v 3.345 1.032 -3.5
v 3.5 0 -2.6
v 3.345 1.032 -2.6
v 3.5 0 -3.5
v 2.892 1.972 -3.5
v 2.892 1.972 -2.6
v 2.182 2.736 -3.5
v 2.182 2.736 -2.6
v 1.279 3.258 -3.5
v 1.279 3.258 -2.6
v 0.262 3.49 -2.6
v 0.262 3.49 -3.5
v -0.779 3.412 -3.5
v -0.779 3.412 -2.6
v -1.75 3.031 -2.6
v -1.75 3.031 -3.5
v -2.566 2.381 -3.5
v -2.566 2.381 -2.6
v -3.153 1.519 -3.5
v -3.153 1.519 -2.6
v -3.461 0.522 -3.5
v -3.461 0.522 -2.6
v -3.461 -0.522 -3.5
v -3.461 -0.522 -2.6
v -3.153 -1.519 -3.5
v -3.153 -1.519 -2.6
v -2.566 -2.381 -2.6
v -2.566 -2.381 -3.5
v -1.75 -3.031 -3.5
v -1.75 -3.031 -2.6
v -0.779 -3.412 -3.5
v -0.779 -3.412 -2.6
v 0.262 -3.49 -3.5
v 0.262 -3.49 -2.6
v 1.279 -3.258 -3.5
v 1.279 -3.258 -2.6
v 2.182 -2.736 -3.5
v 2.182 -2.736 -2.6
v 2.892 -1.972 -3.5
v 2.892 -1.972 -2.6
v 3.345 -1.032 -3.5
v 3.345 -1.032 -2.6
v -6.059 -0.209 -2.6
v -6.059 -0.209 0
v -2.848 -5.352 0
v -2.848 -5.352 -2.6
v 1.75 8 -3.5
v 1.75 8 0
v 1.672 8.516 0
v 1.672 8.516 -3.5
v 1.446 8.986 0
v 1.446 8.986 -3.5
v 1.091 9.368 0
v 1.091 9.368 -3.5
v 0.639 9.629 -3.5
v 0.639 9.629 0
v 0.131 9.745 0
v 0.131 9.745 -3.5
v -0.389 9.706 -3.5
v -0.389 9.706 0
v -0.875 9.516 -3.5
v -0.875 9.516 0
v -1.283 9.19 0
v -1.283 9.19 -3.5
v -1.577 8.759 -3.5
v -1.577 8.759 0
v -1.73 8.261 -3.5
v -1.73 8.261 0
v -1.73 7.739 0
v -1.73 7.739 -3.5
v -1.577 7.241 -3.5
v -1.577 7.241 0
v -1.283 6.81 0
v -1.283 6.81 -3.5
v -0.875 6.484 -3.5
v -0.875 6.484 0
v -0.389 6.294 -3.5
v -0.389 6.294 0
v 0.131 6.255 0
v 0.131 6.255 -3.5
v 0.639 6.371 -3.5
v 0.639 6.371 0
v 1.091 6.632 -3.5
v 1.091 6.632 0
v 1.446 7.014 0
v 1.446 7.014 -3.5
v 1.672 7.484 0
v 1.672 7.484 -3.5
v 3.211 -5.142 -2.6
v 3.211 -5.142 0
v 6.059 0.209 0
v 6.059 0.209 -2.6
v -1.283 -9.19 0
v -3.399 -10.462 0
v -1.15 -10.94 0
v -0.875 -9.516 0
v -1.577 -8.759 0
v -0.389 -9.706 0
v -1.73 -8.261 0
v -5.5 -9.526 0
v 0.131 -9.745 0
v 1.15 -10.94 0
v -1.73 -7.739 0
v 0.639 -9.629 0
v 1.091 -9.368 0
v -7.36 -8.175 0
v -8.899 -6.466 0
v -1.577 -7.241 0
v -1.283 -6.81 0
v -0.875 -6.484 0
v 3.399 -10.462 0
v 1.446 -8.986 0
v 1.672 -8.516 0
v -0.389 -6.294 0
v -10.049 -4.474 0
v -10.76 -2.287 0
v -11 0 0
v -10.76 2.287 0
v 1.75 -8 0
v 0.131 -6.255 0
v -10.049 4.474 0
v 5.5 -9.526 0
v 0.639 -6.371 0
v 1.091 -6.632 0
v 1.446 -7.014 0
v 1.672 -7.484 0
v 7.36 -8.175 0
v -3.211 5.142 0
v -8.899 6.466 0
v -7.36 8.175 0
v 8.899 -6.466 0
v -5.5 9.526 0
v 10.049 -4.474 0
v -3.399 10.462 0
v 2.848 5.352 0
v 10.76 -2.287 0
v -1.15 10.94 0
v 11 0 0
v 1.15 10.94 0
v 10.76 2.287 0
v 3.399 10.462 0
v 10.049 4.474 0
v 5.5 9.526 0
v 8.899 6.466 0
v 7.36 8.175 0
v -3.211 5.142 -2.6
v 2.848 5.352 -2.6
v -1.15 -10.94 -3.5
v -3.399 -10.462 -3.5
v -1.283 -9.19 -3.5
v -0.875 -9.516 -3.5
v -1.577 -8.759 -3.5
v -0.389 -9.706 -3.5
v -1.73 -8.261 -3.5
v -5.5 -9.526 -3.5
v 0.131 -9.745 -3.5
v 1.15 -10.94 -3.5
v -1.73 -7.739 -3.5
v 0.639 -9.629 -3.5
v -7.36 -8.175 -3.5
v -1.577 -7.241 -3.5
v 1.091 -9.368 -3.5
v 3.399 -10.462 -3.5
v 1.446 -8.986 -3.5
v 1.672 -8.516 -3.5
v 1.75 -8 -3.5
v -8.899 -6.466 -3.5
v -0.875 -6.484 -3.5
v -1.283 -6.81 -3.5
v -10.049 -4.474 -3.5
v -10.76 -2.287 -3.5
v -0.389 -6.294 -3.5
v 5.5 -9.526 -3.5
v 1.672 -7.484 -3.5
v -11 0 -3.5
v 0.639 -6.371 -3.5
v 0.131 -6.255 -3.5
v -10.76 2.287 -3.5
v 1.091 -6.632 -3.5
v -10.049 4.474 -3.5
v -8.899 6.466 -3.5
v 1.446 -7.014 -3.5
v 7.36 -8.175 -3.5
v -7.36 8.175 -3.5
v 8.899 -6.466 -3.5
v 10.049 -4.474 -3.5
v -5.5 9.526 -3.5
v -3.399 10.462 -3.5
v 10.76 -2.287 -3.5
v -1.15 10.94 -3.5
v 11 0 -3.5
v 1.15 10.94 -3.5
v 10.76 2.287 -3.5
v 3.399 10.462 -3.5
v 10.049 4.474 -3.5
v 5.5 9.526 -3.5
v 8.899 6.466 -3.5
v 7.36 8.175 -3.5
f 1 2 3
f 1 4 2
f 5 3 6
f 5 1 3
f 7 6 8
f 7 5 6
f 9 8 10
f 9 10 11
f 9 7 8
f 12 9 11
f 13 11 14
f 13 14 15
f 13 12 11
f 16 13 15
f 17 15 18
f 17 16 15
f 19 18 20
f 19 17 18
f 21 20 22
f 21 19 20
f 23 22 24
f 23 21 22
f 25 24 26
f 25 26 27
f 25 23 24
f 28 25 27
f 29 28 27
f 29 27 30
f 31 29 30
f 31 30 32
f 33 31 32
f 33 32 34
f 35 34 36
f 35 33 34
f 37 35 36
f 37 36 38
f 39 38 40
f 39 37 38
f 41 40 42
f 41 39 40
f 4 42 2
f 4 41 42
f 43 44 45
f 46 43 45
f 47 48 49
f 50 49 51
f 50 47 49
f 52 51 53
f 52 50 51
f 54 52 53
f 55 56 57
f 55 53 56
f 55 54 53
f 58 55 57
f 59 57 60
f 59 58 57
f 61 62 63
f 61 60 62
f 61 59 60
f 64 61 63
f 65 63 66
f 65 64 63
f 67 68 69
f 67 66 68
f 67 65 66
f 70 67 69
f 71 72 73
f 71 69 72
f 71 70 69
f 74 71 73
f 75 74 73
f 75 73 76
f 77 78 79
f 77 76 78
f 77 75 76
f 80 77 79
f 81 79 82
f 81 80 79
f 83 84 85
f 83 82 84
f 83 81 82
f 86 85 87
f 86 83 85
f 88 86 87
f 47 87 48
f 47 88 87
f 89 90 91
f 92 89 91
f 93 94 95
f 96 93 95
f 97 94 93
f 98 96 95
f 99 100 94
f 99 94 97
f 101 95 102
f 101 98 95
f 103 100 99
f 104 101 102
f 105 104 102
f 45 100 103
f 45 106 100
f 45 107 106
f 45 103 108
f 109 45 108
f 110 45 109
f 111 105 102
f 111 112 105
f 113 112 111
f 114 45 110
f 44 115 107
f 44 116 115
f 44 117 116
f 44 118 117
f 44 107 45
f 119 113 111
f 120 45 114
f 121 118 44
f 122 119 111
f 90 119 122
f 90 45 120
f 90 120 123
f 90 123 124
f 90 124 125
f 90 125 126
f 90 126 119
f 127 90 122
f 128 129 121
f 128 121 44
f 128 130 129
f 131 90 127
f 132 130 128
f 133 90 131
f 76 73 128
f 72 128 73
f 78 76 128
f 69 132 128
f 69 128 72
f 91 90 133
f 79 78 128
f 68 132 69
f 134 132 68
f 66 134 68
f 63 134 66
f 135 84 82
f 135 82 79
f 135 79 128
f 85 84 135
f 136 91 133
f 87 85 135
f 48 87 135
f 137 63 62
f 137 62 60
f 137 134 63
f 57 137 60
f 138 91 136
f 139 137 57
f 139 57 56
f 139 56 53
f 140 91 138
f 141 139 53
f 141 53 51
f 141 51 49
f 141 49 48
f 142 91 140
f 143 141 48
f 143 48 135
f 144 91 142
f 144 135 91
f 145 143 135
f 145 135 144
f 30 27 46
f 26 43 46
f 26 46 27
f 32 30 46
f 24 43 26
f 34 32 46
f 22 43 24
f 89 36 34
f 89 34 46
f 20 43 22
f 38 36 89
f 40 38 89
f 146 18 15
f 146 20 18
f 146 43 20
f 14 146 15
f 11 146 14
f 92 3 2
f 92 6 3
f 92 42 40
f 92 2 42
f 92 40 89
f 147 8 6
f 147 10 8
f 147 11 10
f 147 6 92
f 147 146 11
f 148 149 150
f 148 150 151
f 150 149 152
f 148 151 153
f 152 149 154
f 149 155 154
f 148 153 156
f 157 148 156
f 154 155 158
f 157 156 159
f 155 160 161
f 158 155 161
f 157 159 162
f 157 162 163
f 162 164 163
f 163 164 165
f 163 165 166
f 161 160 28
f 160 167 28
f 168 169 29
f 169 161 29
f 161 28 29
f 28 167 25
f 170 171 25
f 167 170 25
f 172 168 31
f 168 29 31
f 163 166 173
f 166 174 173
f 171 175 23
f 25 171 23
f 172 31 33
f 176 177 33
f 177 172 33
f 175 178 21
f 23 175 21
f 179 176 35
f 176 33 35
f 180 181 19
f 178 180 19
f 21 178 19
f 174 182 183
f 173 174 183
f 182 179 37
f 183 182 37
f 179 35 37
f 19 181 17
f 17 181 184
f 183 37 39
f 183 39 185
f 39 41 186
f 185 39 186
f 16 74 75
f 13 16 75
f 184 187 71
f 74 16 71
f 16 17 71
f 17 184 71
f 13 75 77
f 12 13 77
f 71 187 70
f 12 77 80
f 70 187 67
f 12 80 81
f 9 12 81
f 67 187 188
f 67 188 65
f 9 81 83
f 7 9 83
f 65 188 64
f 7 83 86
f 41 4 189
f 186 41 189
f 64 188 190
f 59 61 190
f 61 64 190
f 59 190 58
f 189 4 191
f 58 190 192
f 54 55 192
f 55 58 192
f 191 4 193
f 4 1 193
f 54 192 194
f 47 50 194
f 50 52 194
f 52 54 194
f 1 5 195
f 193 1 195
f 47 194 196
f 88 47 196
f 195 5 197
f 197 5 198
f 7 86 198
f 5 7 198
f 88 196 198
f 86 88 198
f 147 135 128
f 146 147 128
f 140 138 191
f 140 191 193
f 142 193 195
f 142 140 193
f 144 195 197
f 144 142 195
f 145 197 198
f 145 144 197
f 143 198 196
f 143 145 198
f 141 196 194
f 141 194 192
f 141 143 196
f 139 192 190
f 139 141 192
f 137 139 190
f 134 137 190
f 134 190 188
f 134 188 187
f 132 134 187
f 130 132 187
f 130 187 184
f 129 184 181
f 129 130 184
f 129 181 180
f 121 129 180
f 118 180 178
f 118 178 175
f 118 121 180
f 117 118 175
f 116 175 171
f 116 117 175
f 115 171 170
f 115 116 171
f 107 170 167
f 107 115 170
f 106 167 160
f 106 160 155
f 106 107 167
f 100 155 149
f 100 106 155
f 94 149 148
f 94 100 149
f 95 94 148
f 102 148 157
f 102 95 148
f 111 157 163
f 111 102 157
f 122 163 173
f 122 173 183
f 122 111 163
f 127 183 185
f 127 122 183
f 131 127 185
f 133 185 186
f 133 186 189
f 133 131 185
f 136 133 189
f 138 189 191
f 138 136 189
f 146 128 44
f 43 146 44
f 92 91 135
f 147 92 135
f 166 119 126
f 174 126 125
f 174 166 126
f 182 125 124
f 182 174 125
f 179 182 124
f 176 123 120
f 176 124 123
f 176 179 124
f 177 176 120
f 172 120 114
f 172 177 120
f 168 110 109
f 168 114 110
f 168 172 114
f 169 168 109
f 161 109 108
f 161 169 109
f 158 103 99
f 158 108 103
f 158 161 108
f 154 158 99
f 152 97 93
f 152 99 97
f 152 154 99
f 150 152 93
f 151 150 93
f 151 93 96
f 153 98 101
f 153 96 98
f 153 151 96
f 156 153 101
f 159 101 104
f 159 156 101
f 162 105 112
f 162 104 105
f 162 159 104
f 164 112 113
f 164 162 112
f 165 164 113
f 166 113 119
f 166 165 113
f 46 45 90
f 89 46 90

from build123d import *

# Parameters (mm, degrees)
F0_R     = 11
F0_R_2   = 1.75
F0_R_3   = 3.5
F1_DEPTH = 3.5
F2_DEPTH = 2.6
F3_W     = 22
F3_H     = 22
F4_DEPTH = 25


with BuildPart() as f1:
    # F0 (on Top) → F1 (new body, symmetric)
    with BuildSketch(Plane.XY):
        Circle(F0_R)
        with Locations((0, -8)):
            Circle(F0_R_2, mode=Mode.SUBTRACT)
        Polygon((-2.847942, -5.351563), (-6.05856, -0.209391), (-3.210618, 5.142172), (2.847942, 5.351563), (6.05856, 0.209391), (3.210618, -5.142172), align=None, mode=Mode.SUBTRACT)
        with Locations((0, 8)):
            Circle(F0_R_2, mode=Mode.SUBTRACT)
        Polygon((-3.210618, 5.142172), (-6.05856, -0.209391), (-2.847942, -5.351563), (3.210618, -5.142172), (6.05856, 0.209391), (2.847942, 5.351563), align=None)
        Circle(F0_R_3, mode=Mode.SUBTRACT)
    extrude(amount=F1_DEPTH, both=True)

    # F0 (on Top) → F2 (cut, symmetric)
    with BuildSketch(Plane.XY):
        Polygon((-3.210618, 5.142172), (-6.05856, -0.209391), (-2.847942, -5.351563), (3.210618, -5.142172), (6.05856, 0.209391), (2.847942, 5.351563), align=None)
        Circle(F0_R_3, mode=Mode.SUBTRACT)
    extrude(amount=F2_DEPTH, both=True, mode=Mode.SUBTRACT)

    # F3 (on Top) → F4 (cut)
    with BuildSketch(Plane.XY):
        Rectangle(F3_W, F3_H)
    extrude(amount=F4_DEPTH, mode=Mode.SUBTRACT)


solid = f1.part
